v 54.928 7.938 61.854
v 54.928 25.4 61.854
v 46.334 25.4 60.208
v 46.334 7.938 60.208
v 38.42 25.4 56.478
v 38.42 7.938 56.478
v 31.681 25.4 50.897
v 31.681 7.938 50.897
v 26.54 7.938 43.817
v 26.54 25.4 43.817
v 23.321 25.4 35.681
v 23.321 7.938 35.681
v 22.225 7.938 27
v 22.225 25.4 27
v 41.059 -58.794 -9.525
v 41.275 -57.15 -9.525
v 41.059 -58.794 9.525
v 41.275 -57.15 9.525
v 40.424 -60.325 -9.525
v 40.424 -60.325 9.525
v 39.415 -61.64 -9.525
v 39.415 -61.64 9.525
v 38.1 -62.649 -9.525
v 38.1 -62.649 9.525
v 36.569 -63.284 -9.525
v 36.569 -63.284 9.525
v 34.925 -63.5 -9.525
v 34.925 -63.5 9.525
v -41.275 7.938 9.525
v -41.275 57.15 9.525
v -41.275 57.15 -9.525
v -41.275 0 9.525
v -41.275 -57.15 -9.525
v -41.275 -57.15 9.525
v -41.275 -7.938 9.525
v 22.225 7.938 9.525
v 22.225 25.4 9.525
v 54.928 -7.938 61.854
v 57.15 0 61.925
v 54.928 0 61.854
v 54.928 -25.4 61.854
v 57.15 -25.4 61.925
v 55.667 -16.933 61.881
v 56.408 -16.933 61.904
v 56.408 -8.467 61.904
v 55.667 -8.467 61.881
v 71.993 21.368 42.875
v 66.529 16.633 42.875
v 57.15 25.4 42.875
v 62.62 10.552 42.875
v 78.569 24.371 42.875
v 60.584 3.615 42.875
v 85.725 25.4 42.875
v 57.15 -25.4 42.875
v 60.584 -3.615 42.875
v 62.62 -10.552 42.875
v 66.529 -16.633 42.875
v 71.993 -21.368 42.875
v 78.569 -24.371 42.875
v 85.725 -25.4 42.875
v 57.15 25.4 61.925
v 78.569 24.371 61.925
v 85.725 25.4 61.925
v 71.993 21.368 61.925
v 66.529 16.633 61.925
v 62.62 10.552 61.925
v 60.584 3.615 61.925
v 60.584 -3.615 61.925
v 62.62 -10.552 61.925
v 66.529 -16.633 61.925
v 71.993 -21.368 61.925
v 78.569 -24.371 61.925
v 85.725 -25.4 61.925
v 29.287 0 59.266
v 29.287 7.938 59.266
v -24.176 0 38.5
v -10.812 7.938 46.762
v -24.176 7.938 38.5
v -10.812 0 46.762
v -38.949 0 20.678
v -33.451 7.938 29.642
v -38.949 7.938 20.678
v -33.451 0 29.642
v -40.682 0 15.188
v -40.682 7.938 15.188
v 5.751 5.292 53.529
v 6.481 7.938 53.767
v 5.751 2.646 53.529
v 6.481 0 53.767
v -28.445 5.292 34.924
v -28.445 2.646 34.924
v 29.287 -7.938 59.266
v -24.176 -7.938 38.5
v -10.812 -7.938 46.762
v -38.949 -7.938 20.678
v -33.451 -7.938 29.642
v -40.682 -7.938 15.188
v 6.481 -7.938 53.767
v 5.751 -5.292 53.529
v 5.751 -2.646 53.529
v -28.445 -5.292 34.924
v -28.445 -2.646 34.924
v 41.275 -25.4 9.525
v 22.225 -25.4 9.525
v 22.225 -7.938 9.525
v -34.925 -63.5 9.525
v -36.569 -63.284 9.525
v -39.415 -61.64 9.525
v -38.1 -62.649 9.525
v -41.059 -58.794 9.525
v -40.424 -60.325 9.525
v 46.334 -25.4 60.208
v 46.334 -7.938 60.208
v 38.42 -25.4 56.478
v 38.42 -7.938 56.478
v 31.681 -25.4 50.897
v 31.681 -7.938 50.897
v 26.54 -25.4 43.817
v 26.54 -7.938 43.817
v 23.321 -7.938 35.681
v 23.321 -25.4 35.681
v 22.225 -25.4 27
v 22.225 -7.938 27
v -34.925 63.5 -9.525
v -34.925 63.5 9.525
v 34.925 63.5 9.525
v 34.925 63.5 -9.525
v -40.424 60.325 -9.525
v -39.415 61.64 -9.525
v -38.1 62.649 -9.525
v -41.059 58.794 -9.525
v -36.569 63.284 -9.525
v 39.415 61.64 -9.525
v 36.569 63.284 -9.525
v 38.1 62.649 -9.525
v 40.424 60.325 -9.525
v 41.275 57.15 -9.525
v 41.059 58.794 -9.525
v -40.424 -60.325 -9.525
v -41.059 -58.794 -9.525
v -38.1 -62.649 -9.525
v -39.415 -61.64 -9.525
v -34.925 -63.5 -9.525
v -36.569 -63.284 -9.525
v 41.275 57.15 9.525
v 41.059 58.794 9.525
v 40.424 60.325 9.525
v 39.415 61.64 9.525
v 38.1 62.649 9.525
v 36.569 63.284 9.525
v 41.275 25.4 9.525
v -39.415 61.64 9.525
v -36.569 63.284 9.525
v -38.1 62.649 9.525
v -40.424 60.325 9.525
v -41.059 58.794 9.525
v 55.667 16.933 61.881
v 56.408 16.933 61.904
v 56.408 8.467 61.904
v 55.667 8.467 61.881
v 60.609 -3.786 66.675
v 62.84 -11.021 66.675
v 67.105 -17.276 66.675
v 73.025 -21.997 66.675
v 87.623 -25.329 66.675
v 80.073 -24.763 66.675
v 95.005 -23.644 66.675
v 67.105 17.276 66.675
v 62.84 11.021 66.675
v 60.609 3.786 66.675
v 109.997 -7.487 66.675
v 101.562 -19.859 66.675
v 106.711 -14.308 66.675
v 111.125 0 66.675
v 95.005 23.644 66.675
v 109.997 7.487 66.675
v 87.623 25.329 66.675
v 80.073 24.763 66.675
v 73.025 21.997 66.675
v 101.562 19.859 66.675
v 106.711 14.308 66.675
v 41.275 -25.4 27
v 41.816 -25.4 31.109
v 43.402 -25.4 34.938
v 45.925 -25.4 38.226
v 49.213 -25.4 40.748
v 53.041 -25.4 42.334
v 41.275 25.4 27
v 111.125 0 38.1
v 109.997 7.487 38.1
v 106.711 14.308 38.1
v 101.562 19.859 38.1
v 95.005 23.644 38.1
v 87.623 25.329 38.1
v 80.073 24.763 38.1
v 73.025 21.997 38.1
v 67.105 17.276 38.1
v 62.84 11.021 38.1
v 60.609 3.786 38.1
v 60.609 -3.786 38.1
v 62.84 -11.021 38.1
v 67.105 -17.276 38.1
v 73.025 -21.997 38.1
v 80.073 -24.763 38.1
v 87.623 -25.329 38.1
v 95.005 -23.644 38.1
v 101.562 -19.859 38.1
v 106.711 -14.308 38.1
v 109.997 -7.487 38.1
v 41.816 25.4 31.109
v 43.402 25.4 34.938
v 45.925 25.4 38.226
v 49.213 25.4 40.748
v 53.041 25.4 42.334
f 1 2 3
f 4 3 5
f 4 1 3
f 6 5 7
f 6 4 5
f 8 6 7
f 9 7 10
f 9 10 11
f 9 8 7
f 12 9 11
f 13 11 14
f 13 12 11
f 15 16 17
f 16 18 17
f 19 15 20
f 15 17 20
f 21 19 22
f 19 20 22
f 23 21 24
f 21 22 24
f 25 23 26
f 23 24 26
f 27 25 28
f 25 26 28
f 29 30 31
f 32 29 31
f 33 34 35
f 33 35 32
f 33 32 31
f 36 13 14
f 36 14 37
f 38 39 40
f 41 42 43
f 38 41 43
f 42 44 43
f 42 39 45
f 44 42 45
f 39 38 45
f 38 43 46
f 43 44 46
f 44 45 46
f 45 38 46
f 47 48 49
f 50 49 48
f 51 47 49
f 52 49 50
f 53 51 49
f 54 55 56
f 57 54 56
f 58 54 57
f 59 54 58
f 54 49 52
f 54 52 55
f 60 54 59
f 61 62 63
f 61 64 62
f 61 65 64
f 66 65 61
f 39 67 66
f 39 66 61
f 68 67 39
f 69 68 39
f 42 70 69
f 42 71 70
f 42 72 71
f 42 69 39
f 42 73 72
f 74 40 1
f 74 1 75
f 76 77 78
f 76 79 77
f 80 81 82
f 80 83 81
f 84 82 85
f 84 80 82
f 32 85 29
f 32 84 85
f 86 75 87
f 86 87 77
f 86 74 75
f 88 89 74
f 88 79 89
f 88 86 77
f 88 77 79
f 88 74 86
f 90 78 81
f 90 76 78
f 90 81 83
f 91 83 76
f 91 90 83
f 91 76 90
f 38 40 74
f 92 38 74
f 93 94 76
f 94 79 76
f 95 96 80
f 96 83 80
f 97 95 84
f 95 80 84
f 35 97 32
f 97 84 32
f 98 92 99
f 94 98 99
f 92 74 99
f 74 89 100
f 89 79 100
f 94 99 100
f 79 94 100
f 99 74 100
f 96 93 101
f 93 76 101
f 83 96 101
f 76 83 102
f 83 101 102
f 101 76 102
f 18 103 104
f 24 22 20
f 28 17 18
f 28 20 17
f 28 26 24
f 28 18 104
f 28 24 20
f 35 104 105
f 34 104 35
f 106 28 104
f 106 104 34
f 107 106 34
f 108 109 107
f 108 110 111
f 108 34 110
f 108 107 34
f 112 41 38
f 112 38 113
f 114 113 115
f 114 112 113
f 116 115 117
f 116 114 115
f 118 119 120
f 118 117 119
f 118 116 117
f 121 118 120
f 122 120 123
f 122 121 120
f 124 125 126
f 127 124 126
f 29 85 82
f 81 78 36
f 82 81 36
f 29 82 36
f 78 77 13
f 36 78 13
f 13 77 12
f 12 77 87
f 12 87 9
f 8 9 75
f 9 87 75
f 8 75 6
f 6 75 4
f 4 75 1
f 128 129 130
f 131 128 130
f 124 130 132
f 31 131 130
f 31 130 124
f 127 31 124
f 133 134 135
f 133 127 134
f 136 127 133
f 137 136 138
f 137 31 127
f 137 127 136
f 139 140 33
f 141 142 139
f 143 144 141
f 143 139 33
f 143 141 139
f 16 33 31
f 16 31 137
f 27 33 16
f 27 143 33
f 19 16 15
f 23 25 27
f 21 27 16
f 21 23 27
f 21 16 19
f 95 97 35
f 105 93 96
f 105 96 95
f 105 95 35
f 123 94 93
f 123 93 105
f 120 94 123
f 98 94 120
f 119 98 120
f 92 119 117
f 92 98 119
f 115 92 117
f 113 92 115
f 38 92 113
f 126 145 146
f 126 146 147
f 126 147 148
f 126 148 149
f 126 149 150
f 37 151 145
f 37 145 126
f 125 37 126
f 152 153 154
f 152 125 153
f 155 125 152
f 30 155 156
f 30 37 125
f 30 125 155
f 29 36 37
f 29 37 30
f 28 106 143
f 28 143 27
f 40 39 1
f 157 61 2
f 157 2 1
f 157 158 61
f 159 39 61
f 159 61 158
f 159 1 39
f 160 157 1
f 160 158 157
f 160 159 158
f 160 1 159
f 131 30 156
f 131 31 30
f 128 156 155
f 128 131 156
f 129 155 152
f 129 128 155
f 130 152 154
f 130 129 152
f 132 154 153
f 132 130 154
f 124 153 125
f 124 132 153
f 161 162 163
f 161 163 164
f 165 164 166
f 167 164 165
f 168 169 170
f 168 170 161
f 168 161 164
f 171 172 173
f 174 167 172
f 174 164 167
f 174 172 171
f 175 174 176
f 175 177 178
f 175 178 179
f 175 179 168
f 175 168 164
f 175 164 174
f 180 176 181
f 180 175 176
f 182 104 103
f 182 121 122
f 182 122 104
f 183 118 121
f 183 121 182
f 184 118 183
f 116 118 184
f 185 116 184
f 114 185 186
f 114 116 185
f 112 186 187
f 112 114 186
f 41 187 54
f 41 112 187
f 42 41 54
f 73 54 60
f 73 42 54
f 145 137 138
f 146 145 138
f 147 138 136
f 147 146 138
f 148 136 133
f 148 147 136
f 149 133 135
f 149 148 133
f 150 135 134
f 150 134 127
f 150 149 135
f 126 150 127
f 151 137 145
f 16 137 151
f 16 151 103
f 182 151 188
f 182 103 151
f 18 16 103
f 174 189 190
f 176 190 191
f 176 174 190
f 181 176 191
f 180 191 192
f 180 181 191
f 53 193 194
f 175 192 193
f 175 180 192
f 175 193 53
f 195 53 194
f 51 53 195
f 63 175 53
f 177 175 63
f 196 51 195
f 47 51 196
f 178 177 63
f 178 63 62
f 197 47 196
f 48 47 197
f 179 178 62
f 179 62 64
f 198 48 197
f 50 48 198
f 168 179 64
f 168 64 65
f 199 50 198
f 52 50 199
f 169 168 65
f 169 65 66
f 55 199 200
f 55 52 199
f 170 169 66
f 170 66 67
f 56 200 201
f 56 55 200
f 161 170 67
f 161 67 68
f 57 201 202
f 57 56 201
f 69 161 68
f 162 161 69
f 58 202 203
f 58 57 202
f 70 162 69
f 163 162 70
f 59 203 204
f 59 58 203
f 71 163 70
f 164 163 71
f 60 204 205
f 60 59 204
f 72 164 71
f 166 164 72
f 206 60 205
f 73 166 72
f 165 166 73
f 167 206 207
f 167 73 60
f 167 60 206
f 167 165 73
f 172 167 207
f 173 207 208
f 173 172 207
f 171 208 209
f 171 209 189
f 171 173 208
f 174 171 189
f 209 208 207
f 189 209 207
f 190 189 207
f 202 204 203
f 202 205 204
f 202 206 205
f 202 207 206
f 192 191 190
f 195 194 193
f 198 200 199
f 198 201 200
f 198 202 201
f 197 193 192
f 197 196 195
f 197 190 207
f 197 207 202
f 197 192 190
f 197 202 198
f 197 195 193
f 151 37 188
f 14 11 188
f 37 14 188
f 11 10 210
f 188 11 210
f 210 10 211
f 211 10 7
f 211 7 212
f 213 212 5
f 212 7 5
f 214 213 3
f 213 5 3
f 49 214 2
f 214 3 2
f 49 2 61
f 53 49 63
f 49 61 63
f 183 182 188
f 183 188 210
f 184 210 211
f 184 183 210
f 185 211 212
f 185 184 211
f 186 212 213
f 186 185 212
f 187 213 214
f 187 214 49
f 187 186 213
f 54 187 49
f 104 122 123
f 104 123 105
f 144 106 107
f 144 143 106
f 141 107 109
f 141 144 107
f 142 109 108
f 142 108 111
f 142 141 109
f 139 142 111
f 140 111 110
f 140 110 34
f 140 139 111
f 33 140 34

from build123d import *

# Parameters (mm, degrees)
F1_DEPTH = 63.5
F2_DEPTH = 25.4
F3_DEPTH = 7.9375
F5_R     = 6.35


with BuildPart() as f1:
    # F0 (on Front) → F1 (new body, symmetric)
    with BuildSketch(Plane.XZ):
        Polygon((41.275, -9.525), (41.275, 9.525), (22.225, 9.525), (-41.275, 9.525), (-41.275, -9.525), align=None)
    extrude(amount=F1_DEPTH, both=True)

    # F0 (on Front) → F2 (join, symmetric)
    with BuildSketch(Plane.XZ):
        with BuildLine():
            Line((22.225, 9.525), (41.275, 9.525))
            Line((41.275, 9.525), (41.275, 27.0002))
            ThreePointArc((41.275, 27.0002), (45.92468, 38.22552), (57.15, 42.8752))
            Line((57.15, 42.8752), (60.325, 42.8752))
            Line((60.325, 42.8752), (60.325, 61.9252))
            Line((60.325, 61.9252), (57.15, 61.9252))
            add(Edge.make_bspline(
                [(57.15, 61.9252), (56.406917, 61.90542), (55.666126, 61.881815), (54.927698, 61.854425)],
                knots=[0, 0, 0, 0, 1.489577, 1.489577, 1.489577, 1.489577], degree=3))
            ThreePointArc((54.927698, 61.854425), (31.680709, 50.897289), (22.225, 27.0002))
            Line((22.225, 27.0002), (22.225, 9.525))
        make_face()
        Polygon((60.325, 61.9252), (60.325, 42.8752), (78.02037, 42.8752), (85.725, 42.8752), (85.725, 61.9252), (78.02037, 61.9252), align=None)
    extrude(amount=F2_DEPTH, both=True)

    # F0 (on Front) → F3 (join, symmetric)
    with BuildSketch(Plane.XZ):
        with BuildLine():
            Line((-41.275, 9.525), (22.225, 9.525))
            Line((22.225, 9.525), (22.225, 27.0002))
            ThreePointArc((22.225, 27.0002), (31.680709, 50.897289), (54.927698, 61.854425))
            add(Edge.make_bspline(
                [(54.927698, 61.854425), (0.389985, 59.831469), (-41.257529, 37.158326), (-41.275, 9.525)],
                knots=[1.489577, 1.489577, 1.489577, 1.489577, 111.504536, 111.504536, 111.504536, 111.504536], degree=3))
        make_face()
    extrude(amount=F3_DEPTH, both=True)

    # F0 (on Front) → F4 (revolve)
    with BuildSketch(Plane.XZ):
        Polygon((85.725, 42.8752), (85.725, 38.1), (111.125, 38.1), (111.125, 66.675), (85.725, 66.675), (85.725, 61.9252), align=None)
    revolve(axis=Axis((85.725, 0, 52.3875), (0, 0, 1)))

    # F5
    f5_edges = [f1.edges().sort_by_distance(p)[0] for p in [
        (41.275, -63.5, 0),
        (-41.275, -63.5, 0),
        (-41.275, 63.5, 0),
        (41.275, 63.5, 0),
    ]]
    fillet(f5_edges, radius=F5_R)


solid = f1.part
